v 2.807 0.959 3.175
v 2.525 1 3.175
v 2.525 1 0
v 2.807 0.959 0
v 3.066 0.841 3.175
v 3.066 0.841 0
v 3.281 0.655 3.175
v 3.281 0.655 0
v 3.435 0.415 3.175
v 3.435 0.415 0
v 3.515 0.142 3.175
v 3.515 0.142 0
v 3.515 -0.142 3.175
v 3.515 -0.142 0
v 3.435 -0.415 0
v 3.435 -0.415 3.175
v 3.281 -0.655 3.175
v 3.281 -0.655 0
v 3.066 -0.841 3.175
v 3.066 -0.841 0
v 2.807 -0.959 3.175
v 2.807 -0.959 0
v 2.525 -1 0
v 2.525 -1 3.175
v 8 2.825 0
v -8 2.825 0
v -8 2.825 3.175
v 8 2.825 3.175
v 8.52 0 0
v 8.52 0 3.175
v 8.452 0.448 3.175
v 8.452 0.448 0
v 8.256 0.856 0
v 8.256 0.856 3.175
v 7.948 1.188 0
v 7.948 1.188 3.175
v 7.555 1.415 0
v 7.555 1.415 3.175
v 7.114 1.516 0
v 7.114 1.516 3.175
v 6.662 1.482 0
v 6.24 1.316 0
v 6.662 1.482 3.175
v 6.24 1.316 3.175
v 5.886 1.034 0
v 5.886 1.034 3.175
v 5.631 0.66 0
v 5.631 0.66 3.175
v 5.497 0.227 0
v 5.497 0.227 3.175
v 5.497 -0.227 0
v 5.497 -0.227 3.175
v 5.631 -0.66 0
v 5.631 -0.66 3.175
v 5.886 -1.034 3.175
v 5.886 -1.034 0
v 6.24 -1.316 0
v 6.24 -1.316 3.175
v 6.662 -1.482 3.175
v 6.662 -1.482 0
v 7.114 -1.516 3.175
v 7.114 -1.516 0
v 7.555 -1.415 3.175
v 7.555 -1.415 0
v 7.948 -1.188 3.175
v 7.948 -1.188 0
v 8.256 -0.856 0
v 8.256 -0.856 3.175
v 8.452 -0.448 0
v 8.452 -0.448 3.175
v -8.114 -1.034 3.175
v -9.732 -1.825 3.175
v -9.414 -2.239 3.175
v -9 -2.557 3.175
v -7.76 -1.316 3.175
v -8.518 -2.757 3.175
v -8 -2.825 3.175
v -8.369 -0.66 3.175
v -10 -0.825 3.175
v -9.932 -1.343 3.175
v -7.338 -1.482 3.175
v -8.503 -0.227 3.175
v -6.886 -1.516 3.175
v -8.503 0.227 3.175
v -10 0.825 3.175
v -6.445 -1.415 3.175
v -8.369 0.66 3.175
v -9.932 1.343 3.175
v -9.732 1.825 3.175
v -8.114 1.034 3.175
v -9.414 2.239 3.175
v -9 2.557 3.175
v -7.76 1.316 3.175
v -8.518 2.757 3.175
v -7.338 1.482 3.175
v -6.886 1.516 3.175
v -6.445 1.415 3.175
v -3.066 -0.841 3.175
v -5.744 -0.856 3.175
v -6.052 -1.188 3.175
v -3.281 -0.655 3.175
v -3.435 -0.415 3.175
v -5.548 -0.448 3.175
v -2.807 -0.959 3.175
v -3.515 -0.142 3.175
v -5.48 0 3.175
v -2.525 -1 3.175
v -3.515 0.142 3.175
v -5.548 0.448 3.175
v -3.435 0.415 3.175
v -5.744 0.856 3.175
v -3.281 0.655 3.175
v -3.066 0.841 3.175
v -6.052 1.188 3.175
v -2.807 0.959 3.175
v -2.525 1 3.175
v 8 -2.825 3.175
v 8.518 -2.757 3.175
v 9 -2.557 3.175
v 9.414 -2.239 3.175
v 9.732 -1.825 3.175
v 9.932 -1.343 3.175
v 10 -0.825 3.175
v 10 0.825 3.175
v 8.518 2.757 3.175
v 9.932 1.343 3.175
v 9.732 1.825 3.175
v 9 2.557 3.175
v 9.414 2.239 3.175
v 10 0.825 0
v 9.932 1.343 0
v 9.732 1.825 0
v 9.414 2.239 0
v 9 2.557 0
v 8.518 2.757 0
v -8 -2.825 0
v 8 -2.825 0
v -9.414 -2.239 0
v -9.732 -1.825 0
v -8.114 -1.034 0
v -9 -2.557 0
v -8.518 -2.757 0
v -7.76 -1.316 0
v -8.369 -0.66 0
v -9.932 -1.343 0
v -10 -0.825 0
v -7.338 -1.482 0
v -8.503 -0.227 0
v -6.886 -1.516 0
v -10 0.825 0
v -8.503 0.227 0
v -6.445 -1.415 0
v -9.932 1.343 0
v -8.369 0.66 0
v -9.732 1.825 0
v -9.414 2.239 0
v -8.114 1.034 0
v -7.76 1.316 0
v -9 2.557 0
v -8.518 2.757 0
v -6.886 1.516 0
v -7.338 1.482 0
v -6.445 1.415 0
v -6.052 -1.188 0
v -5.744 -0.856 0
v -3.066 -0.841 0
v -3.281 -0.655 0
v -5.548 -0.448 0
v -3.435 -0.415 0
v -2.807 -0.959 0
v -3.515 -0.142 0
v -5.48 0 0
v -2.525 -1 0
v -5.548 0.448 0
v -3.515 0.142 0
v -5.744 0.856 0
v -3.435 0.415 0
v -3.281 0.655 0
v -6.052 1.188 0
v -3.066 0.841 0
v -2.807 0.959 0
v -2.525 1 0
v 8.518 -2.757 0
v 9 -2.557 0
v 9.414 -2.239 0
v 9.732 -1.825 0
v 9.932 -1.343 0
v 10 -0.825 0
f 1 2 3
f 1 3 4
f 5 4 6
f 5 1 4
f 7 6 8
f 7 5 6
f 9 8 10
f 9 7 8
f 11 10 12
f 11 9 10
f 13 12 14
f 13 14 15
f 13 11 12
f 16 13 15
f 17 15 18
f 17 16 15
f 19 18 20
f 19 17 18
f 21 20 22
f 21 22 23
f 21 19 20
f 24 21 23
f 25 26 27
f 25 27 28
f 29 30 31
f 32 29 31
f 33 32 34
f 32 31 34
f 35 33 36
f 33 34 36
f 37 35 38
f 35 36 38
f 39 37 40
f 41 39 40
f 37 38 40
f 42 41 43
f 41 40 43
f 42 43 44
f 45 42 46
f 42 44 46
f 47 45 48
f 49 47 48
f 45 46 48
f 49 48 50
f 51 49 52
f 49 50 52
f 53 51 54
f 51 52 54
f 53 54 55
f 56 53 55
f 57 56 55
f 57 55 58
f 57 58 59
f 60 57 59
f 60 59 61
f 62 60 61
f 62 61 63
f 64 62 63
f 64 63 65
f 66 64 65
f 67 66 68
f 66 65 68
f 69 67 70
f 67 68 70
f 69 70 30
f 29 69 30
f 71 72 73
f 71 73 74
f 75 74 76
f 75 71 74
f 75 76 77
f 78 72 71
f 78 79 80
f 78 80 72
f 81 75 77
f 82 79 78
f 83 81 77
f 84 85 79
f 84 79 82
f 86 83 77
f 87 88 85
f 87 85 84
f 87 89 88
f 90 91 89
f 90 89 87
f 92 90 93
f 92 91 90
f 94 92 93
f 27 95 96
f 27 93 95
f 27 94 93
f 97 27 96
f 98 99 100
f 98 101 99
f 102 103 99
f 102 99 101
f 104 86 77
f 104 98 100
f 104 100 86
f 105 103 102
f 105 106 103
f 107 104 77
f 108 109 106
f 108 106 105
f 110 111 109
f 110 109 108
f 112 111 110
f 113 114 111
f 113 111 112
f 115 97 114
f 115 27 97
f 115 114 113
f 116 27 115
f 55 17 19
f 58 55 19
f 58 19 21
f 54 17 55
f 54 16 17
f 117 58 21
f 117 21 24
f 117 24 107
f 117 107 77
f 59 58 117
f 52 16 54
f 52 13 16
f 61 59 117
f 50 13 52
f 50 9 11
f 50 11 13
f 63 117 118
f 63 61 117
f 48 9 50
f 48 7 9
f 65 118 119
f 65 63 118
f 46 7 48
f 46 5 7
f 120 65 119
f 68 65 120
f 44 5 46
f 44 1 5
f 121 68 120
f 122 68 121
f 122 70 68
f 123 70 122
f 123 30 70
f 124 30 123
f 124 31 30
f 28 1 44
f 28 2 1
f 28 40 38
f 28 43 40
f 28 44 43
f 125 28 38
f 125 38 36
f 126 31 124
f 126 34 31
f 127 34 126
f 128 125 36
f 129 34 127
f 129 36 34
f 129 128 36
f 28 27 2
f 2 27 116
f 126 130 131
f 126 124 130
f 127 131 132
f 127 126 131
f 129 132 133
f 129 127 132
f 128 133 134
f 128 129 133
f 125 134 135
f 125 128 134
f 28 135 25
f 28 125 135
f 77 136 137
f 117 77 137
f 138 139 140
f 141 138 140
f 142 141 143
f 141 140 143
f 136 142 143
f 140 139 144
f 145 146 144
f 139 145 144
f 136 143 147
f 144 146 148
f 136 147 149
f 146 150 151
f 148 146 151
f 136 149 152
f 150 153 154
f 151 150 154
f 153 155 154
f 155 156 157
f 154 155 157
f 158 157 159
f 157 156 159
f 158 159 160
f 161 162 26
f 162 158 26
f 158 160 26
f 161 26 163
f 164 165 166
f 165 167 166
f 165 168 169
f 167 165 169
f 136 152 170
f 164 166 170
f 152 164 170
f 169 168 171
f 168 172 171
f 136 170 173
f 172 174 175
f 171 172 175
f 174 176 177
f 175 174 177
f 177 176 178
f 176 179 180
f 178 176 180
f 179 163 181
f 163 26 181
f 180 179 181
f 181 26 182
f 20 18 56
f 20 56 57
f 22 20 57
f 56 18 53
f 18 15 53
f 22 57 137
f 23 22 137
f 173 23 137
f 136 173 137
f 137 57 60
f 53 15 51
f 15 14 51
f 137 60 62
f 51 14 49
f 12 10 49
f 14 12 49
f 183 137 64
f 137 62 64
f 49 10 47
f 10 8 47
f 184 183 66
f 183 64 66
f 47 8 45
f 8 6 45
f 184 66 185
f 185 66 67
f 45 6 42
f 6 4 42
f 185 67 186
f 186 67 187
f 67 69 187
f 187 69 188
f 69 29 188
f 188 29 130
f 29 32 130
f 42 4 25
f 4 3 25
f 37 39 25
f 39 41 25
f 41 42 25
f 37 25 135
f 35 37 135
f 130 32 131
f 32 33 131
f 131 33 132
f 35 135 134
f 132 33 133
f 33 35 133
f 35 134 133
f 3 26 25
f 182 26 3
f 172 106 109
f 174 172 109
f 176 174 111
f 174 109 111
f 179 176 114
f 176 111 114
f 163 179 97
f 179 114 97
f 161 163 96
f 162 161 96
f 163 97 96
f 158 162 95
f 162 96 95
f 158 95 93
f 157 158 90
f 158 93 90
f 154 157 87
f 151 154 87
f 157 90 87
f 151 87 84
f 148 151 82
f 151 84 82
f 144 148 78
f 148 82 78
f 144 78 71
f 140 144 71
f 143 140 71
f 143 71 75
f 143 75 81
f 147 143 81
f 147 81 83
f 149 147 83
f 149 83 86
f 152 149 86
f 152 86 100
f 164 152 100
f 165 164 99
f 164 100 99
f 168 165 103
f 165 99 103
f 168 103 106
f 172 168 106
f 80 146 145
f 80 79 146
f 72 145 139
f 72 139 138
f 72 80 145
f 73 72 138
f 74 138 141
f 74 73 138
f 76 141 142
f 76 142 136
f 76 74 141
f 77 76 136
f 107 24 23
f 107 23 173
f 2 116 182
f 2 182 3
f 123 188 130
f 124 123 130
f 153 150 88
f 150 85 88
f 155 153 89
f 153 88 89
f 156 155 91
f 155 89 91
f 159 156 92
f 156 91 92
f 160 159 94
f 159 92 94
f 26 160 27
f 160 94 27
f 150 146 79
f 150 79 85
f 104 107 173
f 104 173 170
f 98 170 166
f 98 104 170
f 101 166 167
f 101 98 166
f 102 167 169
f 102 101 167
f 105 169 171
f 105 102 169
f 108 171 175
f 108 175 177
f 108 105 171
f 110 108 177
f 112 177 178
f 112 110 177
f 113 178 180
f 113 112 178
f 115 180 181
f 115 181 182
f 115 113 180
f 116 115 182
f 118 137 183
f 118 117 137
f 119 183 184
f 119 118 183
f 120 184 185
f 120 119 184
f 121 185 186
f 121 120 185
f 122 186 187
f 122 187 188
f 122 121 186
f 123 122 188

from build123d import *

# Parameters (mm, degrees)
SKETCH1_W           = 20
SKETCH1_H           = 5.65
BOSS_EXTRUDE1_DEPTH = 3.175
FILLET1_R           = 2
SKETCH2_R           = 1.52
CUT_EXTRUDE1_DEPTH  = 3.175


with BuildPart() as part:
    # Sketch1 → Boss-Extrude1 (new body)
    with BuildSketch(Plane.XY):
        Rectangle(SKETCH1_W, SKETCH1_H)
    extrude(amount=BOSS_EXTRUDE1_DEPTH)

    # Fillet1
    fillet1_edges = [part.edges().sort_by_distance(p)[0] for p in [
        (10, -2.825, 1.5875),
        (-10, -2.825, 1.5875),
        (-10, 2.825, 1.5875),
        (10, 2.825, 1.5875),
    ]]
    fillet(fillet1_edges, radius=FILLET1_R)

    # Sketch2 → Cut-Extrude1 (cut)
    with BuildSketch(Plane.XY.offset(3.175)):
        with Locations((-7, 0)):
            Circle(SKETCH2_R)
        with Locations((7, 0)):
            Circle(SKETCH2_R)
        with BuildLine():
            Line((-2.525, 1), (2.525, 1))
            ThreePointArc((2.525, 1), (3.525, 0), (2.525, -1))
            Line((2.525, -1), (-2.525, -1))
            ThreePointArc((-2.525, -1), (-3.525, 0), (-2.525, 1))
        make_face()
    extrude(amount=-CUT_EXTRUDE1_DEPTH, mode=Mode.SUBTRACT)


solid = part.part
